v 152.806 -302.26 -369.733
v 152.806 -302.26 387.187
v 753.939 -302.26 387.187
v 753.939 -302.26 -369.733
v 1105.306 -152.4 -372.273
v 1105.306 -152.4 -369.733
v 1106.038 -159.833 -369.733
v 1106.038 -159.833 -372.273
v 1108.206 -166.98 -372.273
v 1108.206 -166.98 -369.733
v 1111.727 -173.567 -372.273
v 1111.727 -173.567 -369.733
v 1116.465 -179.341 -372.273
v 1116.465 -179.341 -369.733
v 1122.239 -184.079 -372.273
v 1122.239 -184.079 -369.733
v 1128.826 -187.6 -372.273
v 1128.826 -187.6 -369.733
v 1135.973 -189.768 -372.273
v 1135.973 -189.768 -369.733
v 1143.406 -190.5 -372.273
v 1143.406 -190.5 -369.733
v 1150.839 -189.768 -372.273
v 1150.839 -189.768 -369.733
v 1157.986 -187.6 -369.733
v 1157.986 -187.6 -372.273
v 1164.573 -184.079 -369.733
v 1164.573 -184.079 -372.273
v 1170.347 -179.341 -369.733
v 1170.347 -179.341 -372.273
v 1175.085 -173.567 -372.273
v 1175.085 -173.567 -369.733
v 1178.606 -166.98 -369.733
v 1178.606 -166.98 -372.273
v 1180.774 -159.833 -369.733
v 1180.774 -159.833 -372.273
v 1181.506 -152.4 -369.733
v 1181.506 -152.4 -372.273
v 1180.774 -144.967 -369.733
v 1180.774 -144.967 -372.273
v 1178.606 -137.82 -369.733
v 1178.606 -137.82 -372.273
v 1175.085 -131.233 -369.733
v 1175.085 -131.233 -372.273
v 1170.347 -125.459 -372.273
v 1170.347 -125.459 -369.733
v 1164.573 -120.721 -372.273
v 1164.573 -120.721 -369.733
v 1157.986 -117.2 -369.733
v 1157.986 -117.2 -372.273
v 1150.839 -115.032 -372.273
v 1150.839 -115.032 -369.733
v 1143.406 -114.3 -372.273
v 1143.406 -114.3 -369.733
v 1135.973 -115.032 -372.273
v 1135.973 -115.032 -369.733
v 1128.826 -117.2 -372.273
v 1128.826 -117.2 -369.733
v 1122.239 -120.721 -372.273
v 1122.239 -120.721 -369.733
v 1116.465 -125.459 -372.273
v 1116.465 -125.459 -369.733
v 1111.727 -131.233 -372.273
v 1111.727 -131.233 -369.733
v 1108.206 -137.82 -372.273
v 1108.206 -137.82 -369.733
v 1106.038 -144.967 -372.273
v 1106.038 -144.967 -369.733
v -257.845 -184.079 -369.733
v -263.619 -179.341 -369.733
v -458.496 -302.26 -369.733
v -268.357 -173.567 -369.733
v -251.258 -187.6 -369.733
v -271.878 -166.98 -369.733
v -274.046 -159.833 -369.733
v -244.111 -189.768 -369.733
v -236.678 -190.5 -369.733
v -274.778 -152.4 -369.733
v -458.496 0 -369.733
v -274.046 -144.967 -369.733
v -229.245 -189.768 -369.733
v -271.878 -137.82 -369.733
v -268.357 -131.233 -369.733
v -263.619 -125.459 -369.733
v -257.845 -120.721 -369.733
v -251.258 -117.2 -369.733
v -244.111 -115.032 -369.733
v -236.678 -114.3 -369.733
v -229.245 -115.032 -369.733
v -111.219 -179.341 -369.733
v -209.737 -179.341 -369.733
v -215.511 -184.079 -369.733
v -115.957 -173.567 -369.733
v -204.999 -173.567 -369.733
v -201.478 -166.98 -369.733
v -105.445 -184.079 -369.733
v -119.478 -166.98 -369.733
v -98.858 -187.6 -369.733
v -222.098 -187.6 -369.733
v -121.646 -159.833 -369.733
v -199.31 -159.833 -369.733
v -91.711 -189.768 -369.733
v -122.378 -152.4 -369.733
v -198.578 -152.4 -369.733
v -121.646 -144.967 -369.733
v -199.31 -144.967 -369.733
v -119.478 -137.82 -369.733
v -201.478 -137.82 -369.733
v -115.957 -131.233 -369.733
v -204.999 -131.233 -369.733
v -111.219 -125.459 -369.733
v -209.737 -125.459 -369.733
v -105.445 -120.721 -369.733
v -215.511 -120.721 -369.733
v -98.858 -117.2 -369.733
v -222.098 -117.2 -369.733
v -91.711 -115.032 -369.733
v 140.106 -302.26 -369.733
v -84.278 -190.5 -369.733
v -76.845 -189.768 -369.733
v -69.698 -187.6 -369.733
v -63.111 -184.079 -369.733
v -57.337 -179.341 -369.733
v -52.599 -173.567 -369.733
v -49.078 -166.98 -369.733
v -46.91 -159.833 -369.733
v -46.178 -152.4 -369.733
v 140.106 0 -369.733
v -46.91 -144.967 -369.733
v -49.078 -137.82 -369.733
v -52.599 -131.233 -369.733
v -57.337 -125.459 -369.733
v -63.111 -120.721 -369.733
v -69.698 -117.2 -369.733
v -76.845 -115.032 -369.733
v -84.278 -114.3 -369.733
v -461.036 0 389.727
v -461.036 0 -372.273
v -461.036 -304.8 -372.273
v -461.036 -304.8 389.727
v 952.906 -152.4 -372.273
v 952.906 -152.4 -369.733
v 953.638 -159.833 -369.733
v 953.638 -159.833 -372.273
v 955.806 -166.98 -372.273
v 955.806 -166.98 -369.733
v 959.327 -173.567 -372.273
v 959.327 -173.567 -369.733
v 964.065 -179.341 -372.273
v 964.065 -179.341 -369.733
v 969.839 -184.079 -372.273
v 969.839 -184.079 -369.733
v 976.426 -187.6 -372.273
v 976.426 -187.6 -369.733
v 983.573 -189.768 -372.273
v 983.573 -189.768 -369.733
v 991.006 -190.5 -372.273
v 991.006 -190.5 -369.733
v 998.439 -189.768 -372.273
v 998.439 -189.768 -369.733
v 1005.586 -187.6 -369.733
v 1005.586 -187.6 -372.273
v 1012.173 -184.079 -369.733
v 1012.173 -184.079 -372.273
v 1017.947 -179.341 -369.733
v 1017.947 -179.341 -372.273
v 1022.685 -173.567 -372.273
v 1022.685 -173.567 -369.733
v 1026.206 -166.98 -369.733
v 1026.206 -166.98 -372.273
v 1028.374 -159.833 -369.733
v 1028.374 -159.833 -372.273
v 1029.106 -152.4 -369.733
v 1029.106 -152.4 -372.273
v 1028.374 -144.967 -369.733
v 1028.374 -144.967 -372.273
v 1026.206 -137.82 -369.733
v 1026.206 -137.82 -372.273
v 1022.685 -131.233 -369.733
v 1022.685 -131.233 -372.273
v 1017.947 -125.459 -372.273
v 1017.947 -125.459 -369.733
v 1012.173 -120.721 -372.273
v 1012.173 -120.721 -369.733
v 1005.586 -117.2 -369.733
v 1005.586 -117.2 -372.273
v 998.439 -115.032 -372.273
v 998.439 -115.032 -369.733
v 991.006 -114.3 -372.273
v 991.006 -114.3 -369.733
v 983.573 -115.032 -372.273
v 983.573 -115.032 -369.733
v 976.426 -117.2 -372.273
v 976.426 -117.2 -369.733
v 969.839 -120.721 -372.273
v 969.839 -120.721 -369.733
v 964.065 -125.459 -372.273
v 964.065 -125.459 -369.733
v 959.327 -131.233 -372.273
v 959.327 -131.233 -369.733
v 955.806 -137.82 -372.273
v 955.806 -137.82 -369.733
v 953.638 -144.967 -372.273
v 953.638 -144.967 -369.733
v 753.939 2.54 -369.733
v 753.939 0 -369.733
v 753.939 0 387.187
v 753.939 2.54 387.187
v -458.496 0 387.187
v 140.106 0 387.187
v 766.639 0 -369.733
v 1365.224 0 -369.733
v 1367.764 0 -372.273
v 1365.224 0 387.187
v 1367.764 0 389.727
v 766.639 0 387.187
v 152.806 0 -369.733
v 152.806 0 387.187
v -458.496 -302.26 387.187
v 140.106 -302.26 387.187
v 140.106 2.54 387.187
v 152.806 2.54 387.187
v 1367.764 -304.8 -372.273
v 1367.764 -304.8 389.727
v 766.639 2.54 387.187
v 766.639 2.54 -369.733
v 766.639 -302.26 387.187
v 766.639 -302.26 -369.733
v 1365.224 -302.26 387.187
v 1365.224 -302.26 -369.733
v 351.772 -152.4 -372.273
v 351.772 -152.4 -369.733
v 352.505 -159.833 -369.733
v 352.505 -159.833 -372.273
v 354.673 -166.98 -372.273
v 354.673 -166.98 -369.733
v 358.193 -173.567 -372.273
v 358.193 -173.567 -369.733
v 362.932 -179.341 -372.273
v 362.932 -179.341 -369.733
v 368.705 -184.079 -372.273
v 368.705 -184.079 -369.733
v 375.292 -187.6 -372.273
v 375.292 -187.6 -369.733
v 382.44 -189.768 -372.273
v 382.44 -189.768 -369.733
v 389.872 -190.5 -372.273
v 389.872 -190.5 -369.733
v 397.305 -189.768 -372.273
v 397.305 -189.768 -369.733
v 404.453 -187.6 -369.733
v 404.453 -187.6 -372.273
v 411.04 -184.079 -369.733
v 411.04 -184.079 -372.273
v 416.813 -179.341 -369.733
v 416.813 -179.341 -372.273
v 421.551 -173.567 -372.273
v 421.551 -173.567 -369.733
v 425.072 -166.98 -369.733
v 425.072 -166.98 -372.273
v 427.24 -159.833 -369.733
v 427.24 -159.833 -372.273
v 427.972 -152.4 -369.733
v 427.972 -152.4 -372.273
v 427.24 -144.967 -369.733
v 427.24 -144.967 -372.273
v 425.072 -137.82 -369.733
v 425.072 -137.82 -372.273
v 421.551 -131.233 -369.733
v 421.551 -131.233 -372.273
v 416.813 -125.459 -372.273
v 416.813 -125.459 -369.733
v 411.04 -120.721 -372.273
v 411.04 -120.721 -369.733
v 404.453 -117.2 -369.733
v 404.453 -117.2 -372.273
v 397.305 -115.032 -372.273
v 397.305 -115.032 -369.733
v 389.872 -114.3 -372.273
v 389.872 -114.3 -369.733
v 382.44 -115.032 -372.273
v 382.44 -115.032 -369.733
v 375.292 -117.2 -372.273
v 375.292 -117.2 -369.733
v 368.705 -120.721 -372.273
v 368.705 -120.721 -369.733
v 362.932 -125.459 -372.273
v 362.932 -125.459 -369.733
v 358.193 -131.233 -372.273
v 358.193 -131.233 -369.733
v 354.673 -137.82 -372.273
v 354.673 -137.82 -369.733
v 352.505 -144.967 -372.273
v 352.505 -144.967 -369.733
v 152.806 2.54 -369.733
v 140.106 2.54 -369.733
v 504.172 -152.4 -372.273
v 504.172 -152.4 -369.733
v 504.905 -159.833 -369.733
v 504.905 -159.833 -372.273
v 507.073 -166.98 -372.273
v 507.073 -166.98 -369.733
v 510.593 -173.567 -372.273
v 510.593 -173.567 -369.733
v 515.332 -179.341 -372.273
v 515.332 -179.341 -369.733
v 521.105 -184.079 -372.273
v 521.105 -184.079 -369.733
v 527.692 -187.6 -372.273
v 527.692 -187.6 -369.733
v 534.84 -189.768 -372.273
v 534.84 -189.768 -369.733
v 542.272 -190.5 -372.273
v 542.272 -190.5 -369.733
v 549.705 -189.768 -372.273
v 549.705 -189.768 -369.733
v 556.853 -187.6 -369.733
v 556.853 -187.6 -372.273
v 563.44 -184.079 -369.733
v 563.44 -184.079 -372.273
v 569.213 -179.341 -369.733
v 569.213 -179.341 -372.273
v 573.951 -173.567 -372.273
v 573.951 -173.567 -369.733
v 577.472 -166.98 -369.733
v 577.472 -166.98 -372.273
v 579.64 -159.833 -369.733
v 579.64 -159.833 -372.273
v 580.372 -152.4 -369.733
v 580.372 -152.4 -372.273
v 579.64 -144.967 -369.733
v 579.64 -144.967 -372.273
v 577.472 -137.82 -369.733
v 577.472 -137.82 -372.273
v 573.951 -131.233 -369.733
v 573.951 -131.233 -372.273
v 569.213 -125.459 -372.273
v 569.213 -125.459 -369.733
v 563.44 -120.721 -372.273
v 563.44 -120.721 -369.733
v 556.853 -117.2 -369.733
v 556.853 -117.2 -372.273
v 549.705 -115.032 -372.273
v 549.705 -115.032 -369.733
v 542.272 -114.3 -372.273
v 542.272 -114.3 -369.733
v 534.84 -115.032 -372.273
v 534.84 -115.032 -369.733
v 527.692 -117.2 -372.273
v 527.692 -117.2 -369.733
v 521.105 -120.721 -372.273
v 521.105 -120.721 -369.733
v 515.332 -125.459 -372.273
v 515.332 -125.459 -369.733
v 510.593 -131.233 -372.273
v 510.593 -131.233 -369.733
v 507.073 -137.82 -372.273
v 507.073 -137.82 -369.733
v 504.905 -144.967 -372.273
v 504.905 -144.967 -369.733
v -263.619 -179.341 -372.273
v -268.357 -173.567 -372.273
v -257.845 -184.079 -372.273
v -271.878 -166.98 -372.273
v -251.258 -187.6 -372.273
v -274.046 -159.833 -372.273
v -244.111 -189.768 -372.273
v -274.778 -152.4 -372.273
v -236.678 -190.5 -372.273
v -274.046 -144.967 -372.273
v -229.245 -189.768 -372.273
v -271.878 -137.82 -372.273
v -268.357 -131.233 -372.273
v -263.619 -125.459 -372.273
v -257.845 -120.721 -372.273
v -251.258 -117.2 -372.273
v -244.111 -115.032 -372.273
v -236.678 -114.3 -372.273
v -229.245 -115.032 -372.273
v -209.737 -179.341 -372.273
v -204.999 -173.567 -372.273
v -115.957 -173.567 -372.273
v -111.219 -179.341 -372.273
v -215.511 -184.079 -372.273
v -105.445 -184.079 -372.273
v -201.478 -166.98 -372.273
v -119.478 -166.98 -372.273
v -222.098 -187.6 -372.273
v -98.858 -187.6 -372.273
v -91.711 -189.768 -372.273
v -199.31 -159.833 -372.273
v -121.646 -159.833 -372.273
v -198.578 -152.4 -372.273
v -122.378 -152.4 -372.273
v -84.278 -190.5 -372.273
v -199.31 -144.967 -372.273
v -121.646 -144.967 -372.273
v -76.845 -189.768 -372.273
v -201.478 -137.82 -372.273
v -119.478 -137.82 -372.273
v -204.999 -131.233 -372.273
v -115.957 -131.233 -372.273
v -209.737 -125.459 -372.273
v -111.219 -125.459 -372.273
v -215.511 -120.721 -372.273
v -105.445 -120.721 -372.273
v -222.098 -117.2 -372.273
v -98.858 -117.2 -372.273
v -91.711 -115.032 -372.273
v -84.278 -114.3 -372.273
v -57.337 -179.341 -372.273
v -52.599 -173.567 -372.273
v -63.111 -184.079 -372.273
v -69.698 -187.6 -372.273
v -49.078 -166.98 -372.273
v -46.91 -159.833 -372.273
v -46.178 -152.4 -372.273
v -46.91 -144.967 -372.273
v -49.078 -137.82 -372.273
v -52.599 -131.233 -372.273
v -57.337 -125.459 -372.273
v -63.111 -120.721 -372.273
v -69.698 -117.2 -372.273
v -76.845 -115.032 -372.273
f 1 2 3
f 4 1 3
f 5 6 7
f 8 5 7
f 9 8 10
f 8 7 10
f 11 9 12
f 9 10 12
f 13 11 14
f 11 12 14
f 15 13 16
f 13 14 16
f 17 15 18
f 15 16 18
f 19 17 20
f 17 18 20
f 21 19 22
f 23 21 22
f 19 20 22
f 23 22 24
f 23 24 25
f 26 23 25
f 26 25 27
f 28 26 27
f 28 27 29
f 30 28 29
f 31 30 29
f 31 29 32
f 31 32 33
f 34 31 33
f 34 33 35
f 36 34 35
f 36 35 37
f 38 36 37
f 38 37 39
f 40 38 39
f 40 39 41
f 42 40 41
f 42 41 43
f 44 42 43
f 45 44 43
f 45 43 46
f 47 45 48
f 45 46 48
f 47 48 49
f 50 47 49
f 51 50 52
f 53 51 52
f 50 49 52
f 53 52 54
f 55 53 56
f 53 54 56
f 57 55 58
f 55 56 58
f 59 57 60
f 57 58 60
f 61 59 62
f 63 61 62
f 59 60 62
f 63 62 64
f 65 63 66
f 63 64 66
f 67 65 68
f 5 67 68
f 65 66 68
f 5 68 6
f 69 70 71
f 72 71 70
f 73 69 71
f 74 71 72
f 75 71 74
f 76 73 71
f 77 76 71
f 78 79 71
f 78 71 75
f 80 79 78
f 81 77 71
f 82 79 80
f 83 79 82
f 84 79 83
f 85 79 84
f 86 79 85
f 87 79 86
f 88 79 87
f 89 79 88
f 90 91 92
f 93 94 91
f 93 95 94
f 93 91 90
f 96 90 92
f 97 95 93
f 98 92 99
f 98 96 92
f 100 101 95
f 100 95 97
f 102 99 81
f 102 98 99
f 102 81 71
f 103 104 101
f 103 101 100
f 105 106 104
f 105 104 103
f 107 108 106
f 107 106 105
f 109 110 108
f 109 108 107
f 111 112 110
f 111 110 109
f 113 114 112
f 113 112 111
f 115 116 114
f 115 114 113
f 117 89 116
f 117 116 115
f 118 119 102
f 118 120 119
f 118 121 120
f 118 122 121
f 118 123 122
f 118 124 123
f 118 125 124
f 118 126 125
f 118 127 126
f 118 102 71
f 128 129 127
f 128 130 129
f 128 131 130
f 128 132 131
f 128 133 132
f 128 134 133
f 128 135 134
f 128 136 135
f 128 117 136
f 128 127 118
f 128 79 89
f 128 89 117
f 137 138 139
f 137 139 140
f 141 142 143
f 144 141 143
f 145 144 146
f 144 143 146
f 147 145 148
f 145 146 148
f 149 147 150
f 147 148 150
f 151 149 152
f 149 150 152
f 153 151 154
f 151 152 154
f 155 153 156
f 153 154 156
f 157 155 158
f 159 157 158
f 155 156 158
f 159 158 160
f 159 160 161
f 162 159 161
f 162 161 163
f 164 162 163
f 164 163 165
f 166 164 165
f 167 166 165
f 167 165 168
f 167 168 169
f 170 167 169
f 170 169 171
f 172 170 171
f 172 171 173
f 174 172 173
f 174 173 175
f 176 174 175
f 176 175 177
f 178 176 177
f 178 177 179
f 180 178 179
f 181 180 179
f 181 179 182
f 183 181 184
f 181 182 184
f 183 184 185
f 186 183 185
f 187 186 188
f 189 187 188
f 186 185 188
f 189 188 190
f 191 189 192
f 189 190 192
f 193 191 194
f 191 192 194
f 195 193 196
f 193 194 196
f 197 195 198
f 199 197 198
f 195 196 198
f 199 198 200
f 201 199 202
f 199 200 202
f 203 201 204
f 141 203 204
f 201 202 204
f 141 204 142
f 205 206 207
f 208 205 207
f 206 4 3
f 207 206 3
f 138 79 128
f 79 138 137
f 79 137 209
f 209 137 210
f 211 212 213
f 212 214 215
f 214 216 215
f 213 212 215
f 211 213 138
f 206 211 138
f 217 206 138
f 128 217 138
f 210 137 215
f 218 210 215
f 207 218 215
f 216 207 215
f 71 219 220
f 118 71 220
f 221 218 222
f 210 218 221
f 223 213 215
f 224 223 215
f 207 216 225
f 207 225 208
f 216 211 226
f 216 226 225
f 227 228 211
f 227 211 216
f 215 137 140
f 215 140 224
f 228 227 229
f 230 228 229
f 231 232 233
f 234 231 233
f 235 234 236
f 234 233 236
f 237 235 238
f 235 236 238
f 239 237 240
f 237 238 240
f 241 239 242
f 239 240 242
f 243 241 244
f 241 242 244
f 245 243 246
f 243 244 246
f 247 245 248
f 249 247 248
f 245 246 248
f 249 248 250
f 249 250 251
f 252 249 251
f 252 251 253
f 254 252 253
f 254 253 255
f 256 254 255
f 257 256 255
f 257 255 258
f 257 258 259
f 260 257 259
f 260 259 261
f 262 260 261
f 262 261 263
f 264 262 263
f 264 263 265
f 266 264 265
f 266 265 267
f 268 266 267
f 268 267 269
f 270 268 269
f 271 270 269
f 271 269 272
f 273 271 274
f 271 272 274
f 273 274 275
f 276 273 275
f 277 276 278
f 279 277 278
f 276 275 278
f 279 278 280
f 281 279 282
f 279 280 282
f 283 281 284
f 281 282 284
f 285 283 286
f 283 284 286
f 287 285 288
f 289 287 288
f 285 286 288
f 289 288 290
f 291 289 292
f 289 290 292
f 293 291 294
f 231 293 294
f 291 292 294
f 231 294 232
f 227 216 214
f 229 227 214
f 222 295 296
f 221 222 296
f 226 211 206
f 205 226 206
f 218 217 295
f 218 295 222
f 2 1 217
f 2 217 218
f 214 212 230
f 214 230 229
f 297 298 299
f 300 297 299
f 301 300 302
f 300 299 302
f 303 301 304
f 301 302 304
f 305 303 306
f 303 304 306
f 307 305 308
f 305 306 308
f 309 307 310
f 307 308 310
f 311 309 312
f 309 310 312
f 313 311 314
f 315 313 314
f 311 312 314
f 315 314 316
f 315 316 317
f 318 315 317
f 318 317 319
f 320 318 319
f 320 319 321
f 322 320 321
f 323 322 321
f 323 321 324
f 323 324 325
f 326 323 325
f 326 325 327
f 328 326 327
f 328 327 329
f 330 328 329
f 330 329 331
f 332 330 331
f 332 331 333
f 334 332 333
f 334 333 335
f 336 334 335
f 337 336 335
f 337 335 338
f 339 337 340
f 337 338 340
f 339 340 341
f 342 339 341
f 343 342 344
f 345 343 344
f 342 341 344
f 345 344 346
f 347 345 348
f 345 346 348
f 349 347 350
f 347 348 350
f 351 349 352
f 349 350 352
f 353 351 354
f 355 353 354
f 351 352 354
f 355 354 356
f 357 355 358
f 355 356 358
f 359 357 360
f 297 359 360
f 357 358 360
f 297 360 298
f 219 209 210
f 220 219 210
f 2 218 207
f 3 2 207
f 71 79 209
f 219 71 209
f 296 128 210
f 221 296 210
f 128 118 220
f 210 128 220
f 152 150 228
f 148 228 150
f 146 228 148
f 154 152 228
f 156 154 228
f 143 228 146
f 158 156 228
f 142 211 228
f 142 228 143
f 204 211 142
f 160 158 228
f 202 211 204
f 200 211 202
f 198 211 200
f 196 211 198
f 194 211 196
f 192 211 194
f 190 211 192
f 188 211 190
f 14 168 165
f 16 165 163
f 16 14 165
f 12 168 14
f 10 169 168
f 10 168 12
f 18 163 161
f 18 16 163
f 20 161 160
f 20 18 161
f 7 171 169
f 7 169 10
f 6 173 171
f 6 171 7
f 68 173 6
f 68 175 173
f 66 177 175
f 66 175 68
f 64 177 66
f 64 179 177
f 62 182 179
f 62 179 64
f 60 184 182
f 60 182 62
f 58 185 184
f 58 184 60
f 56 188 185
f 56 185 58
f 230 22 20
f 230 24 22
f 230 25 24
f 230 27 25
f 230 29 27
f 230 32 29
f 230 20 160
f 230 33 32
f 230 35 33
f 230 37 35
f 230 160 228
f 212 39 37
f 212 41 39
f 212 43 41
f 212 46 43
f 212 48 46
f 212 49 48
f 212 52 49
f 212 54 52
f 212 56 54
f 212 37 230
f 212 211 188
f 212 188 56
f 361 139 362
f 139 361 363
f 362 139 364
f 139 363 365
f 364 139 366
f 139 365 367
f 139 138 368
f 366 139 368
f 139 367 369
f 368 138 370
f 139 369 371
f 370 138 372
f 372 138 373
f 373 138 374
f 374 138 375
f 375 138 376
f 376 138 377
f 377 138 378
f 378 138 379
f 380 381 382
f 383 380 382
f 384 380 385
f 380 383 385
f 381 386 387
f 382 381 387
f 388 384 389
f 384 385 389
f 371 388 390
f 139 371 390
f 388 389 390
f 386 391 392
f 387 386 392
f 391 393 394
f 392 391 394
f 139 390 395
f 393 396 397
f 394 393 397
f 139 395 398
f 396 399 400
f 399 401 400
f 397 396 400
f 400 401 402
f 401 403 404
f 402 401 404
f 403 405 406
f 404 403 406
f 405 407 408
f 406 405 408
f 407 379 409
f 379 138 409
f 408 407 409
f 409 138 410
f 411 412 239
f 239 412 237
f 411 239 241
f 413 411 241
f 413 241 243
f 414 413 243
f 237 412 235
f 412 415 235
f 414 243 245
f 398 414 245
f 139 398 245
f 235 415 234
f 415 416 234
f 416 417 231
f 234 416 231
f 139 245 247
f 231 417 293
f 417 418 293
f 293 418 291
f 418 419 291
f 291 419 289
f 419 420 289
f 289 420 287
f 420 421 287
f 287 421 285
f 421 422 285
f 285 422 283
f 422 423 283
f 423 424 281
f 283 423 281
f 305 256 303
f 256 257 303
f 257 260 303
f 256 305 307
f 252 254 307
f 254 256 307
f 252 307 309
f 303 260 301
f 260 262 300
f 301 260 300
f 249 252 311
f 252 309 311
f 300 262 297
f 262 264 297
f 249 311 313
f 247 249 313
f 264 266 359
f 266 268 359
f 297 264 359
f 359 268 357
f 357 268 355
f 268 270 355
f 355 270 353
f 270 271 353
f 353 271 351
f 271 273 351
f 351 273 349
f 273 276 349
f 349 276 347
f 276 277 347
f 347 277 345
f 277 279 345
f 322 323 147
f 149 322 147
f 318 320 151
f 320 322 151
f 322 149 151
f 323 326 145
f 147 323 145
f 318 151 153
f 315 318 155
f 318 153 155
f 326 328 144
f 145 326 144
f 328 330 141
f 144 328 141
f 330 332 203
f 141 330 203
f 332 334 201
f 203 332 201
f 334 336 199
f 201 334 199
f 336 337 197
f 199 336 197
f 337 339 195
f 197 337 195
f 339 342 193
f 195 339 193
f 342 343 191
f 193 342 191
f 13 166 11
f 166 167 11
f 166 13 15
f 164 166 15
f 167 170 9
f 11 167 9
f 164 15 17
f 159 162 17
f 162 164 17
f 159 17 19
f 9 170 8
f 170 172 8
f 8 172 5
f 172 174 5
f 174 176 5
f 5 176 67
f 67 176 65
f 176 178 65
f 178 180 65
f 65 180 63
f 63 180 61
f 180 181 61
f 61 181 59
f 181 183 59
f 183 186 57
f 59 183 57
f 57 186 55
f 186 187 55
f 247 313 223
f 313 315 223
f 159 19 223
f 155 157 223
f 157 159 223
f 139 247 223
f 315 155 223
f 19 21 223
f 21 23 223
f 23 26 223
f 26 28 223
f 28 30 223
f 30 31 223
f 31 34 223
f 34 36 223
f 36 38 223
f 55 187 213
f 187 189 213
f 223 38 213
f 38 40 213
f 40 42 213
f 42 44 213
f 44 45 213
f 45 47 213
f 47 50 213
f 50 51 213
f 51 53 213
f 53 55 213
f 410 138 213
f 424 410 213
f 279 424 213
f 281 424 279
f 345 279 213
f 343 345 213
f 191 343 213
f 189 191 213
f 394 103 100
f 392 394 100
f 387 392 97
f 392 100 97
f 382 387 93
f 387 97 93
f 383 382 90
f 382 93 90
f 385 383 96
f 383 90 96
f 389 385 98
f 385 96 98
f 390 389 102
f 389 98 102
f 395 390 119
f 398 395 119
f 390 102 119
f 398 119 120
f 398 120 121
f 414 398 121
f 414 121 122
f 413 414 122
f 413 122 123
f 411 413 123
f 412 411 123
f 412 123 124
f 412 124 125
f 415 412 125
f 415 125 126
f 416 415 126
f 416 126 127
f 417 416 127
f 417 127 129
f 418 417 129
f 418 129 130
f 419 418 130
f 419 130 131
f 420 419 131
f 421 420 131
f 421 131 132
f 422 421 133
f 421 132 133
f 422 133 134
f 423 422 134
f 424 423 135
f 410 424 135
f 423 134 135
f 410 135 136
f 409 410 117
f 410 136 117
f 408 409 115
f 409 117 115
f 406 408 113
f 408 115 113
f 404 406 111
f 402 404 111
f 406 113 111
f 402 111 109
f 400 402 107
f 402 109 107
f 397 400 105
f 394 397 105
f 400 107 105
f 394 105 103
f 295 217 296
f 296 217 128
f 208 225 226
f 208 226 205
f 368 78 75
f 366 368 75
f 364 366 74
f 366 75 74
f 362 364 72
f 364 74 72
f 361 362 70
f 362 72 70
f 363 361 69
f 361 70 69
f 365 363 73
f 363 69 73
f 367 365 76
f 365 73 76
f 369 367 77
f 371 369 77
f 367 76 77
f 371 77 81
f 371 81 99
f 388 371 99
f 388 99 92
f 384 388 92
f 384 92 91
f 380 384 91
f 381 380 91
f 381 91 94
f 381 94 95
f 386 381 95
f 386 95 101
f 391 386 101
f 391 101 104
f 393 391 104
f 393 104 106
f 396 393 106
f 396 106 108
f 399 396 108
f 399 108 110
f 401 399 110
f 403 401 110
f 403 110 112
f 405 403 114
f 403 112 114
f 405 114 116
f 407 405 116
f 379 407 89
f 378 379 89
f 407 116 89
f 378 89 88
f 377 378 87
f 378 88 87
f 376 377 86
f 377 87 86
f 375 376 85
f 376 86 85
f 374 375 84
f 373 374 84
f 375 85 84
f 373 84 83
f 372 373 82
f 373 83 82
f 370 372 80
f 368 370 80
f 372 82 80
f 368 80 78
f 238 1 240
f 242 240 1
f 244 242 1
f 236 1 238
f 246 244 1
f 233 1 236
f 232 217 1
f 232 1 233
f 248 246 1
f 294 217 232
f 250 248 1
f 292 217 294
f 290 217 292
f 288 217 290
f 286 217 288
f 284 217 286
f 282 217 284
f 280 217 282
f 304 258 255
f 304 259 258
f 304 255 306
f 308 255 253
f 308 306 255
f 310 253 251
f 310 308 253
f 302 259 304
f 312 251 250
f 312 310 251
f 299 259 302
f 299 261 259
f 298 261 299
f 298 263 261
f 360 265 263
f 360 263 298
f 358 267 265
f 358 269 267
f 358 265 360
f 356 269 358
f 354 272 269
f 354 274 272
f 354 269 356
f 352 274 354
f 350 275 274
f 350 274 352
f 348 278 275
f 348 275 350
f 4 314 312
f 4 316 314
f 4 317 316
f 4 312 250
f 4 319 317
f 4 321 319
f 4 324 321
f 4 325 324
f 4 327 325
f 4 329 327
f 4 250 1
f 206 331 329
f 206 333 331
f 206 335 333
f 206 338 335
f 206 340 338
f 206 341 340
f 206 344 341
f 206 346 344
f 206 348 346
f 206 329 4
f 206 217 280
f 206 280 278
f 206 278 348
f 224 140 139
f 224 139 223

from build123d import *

# Parameters (mm, degrees)
F0_W     = 1828.8
F0_H     = 762
F1_DEPTH = 304.8
F2_T     = -2.54
F4_D     = 76.2
F4_DEPTH = 12.7
F5_W     = 12.7
F5_H     = 756.92
F6_DEPTH = 304.8


with BuildPart() as f1:
    # F0 (on Front) → F1 (new body)
    with BuildSketch(Plane.XZ):
        with Locations((453.363994, 8.726588)):
            Rectangle(F0_W, F0_H)
    extrude(amount=F1_DEPTH)

    # F2
    f2_openings = [f1.faces().sort_by_distance(p)[0] for p in [
        (453.363994, 0, 8.726588),
    ]]
    offset(amount=F2_T, openings=f2_openings)

    # F4
    with Locations(Plane(origin=(0, 0, -372.273412), x_dir=(1, 0, 0), z_dir=(0, 0, -1))):
        with Locations((-236.677806, 152.4), (-84.277806, 152.4), (389.872461, 152.4), (542.272461, 152.4), (991.005794, 152.4), (1143.405794, 152.4)):
            Hole(F4_D / 2, depth=F4_DEPTH)

    # F5 (on face) → F6 (join)
    with BuildSketch(Plane(origin=(0, -302.26, 0), x_dir=(-1, 0, 0), z_dir=(0, 1, 0))):
        with Locations((-760.289127, 8.726588)):
            Rectangle(F5_W, F5_H)
        with Locations((-146.455794, 8.726588)):
            Rectangle(F5_W, F5_H)
    extrude(amount=F6_DEPTH)


solid = f1.part
